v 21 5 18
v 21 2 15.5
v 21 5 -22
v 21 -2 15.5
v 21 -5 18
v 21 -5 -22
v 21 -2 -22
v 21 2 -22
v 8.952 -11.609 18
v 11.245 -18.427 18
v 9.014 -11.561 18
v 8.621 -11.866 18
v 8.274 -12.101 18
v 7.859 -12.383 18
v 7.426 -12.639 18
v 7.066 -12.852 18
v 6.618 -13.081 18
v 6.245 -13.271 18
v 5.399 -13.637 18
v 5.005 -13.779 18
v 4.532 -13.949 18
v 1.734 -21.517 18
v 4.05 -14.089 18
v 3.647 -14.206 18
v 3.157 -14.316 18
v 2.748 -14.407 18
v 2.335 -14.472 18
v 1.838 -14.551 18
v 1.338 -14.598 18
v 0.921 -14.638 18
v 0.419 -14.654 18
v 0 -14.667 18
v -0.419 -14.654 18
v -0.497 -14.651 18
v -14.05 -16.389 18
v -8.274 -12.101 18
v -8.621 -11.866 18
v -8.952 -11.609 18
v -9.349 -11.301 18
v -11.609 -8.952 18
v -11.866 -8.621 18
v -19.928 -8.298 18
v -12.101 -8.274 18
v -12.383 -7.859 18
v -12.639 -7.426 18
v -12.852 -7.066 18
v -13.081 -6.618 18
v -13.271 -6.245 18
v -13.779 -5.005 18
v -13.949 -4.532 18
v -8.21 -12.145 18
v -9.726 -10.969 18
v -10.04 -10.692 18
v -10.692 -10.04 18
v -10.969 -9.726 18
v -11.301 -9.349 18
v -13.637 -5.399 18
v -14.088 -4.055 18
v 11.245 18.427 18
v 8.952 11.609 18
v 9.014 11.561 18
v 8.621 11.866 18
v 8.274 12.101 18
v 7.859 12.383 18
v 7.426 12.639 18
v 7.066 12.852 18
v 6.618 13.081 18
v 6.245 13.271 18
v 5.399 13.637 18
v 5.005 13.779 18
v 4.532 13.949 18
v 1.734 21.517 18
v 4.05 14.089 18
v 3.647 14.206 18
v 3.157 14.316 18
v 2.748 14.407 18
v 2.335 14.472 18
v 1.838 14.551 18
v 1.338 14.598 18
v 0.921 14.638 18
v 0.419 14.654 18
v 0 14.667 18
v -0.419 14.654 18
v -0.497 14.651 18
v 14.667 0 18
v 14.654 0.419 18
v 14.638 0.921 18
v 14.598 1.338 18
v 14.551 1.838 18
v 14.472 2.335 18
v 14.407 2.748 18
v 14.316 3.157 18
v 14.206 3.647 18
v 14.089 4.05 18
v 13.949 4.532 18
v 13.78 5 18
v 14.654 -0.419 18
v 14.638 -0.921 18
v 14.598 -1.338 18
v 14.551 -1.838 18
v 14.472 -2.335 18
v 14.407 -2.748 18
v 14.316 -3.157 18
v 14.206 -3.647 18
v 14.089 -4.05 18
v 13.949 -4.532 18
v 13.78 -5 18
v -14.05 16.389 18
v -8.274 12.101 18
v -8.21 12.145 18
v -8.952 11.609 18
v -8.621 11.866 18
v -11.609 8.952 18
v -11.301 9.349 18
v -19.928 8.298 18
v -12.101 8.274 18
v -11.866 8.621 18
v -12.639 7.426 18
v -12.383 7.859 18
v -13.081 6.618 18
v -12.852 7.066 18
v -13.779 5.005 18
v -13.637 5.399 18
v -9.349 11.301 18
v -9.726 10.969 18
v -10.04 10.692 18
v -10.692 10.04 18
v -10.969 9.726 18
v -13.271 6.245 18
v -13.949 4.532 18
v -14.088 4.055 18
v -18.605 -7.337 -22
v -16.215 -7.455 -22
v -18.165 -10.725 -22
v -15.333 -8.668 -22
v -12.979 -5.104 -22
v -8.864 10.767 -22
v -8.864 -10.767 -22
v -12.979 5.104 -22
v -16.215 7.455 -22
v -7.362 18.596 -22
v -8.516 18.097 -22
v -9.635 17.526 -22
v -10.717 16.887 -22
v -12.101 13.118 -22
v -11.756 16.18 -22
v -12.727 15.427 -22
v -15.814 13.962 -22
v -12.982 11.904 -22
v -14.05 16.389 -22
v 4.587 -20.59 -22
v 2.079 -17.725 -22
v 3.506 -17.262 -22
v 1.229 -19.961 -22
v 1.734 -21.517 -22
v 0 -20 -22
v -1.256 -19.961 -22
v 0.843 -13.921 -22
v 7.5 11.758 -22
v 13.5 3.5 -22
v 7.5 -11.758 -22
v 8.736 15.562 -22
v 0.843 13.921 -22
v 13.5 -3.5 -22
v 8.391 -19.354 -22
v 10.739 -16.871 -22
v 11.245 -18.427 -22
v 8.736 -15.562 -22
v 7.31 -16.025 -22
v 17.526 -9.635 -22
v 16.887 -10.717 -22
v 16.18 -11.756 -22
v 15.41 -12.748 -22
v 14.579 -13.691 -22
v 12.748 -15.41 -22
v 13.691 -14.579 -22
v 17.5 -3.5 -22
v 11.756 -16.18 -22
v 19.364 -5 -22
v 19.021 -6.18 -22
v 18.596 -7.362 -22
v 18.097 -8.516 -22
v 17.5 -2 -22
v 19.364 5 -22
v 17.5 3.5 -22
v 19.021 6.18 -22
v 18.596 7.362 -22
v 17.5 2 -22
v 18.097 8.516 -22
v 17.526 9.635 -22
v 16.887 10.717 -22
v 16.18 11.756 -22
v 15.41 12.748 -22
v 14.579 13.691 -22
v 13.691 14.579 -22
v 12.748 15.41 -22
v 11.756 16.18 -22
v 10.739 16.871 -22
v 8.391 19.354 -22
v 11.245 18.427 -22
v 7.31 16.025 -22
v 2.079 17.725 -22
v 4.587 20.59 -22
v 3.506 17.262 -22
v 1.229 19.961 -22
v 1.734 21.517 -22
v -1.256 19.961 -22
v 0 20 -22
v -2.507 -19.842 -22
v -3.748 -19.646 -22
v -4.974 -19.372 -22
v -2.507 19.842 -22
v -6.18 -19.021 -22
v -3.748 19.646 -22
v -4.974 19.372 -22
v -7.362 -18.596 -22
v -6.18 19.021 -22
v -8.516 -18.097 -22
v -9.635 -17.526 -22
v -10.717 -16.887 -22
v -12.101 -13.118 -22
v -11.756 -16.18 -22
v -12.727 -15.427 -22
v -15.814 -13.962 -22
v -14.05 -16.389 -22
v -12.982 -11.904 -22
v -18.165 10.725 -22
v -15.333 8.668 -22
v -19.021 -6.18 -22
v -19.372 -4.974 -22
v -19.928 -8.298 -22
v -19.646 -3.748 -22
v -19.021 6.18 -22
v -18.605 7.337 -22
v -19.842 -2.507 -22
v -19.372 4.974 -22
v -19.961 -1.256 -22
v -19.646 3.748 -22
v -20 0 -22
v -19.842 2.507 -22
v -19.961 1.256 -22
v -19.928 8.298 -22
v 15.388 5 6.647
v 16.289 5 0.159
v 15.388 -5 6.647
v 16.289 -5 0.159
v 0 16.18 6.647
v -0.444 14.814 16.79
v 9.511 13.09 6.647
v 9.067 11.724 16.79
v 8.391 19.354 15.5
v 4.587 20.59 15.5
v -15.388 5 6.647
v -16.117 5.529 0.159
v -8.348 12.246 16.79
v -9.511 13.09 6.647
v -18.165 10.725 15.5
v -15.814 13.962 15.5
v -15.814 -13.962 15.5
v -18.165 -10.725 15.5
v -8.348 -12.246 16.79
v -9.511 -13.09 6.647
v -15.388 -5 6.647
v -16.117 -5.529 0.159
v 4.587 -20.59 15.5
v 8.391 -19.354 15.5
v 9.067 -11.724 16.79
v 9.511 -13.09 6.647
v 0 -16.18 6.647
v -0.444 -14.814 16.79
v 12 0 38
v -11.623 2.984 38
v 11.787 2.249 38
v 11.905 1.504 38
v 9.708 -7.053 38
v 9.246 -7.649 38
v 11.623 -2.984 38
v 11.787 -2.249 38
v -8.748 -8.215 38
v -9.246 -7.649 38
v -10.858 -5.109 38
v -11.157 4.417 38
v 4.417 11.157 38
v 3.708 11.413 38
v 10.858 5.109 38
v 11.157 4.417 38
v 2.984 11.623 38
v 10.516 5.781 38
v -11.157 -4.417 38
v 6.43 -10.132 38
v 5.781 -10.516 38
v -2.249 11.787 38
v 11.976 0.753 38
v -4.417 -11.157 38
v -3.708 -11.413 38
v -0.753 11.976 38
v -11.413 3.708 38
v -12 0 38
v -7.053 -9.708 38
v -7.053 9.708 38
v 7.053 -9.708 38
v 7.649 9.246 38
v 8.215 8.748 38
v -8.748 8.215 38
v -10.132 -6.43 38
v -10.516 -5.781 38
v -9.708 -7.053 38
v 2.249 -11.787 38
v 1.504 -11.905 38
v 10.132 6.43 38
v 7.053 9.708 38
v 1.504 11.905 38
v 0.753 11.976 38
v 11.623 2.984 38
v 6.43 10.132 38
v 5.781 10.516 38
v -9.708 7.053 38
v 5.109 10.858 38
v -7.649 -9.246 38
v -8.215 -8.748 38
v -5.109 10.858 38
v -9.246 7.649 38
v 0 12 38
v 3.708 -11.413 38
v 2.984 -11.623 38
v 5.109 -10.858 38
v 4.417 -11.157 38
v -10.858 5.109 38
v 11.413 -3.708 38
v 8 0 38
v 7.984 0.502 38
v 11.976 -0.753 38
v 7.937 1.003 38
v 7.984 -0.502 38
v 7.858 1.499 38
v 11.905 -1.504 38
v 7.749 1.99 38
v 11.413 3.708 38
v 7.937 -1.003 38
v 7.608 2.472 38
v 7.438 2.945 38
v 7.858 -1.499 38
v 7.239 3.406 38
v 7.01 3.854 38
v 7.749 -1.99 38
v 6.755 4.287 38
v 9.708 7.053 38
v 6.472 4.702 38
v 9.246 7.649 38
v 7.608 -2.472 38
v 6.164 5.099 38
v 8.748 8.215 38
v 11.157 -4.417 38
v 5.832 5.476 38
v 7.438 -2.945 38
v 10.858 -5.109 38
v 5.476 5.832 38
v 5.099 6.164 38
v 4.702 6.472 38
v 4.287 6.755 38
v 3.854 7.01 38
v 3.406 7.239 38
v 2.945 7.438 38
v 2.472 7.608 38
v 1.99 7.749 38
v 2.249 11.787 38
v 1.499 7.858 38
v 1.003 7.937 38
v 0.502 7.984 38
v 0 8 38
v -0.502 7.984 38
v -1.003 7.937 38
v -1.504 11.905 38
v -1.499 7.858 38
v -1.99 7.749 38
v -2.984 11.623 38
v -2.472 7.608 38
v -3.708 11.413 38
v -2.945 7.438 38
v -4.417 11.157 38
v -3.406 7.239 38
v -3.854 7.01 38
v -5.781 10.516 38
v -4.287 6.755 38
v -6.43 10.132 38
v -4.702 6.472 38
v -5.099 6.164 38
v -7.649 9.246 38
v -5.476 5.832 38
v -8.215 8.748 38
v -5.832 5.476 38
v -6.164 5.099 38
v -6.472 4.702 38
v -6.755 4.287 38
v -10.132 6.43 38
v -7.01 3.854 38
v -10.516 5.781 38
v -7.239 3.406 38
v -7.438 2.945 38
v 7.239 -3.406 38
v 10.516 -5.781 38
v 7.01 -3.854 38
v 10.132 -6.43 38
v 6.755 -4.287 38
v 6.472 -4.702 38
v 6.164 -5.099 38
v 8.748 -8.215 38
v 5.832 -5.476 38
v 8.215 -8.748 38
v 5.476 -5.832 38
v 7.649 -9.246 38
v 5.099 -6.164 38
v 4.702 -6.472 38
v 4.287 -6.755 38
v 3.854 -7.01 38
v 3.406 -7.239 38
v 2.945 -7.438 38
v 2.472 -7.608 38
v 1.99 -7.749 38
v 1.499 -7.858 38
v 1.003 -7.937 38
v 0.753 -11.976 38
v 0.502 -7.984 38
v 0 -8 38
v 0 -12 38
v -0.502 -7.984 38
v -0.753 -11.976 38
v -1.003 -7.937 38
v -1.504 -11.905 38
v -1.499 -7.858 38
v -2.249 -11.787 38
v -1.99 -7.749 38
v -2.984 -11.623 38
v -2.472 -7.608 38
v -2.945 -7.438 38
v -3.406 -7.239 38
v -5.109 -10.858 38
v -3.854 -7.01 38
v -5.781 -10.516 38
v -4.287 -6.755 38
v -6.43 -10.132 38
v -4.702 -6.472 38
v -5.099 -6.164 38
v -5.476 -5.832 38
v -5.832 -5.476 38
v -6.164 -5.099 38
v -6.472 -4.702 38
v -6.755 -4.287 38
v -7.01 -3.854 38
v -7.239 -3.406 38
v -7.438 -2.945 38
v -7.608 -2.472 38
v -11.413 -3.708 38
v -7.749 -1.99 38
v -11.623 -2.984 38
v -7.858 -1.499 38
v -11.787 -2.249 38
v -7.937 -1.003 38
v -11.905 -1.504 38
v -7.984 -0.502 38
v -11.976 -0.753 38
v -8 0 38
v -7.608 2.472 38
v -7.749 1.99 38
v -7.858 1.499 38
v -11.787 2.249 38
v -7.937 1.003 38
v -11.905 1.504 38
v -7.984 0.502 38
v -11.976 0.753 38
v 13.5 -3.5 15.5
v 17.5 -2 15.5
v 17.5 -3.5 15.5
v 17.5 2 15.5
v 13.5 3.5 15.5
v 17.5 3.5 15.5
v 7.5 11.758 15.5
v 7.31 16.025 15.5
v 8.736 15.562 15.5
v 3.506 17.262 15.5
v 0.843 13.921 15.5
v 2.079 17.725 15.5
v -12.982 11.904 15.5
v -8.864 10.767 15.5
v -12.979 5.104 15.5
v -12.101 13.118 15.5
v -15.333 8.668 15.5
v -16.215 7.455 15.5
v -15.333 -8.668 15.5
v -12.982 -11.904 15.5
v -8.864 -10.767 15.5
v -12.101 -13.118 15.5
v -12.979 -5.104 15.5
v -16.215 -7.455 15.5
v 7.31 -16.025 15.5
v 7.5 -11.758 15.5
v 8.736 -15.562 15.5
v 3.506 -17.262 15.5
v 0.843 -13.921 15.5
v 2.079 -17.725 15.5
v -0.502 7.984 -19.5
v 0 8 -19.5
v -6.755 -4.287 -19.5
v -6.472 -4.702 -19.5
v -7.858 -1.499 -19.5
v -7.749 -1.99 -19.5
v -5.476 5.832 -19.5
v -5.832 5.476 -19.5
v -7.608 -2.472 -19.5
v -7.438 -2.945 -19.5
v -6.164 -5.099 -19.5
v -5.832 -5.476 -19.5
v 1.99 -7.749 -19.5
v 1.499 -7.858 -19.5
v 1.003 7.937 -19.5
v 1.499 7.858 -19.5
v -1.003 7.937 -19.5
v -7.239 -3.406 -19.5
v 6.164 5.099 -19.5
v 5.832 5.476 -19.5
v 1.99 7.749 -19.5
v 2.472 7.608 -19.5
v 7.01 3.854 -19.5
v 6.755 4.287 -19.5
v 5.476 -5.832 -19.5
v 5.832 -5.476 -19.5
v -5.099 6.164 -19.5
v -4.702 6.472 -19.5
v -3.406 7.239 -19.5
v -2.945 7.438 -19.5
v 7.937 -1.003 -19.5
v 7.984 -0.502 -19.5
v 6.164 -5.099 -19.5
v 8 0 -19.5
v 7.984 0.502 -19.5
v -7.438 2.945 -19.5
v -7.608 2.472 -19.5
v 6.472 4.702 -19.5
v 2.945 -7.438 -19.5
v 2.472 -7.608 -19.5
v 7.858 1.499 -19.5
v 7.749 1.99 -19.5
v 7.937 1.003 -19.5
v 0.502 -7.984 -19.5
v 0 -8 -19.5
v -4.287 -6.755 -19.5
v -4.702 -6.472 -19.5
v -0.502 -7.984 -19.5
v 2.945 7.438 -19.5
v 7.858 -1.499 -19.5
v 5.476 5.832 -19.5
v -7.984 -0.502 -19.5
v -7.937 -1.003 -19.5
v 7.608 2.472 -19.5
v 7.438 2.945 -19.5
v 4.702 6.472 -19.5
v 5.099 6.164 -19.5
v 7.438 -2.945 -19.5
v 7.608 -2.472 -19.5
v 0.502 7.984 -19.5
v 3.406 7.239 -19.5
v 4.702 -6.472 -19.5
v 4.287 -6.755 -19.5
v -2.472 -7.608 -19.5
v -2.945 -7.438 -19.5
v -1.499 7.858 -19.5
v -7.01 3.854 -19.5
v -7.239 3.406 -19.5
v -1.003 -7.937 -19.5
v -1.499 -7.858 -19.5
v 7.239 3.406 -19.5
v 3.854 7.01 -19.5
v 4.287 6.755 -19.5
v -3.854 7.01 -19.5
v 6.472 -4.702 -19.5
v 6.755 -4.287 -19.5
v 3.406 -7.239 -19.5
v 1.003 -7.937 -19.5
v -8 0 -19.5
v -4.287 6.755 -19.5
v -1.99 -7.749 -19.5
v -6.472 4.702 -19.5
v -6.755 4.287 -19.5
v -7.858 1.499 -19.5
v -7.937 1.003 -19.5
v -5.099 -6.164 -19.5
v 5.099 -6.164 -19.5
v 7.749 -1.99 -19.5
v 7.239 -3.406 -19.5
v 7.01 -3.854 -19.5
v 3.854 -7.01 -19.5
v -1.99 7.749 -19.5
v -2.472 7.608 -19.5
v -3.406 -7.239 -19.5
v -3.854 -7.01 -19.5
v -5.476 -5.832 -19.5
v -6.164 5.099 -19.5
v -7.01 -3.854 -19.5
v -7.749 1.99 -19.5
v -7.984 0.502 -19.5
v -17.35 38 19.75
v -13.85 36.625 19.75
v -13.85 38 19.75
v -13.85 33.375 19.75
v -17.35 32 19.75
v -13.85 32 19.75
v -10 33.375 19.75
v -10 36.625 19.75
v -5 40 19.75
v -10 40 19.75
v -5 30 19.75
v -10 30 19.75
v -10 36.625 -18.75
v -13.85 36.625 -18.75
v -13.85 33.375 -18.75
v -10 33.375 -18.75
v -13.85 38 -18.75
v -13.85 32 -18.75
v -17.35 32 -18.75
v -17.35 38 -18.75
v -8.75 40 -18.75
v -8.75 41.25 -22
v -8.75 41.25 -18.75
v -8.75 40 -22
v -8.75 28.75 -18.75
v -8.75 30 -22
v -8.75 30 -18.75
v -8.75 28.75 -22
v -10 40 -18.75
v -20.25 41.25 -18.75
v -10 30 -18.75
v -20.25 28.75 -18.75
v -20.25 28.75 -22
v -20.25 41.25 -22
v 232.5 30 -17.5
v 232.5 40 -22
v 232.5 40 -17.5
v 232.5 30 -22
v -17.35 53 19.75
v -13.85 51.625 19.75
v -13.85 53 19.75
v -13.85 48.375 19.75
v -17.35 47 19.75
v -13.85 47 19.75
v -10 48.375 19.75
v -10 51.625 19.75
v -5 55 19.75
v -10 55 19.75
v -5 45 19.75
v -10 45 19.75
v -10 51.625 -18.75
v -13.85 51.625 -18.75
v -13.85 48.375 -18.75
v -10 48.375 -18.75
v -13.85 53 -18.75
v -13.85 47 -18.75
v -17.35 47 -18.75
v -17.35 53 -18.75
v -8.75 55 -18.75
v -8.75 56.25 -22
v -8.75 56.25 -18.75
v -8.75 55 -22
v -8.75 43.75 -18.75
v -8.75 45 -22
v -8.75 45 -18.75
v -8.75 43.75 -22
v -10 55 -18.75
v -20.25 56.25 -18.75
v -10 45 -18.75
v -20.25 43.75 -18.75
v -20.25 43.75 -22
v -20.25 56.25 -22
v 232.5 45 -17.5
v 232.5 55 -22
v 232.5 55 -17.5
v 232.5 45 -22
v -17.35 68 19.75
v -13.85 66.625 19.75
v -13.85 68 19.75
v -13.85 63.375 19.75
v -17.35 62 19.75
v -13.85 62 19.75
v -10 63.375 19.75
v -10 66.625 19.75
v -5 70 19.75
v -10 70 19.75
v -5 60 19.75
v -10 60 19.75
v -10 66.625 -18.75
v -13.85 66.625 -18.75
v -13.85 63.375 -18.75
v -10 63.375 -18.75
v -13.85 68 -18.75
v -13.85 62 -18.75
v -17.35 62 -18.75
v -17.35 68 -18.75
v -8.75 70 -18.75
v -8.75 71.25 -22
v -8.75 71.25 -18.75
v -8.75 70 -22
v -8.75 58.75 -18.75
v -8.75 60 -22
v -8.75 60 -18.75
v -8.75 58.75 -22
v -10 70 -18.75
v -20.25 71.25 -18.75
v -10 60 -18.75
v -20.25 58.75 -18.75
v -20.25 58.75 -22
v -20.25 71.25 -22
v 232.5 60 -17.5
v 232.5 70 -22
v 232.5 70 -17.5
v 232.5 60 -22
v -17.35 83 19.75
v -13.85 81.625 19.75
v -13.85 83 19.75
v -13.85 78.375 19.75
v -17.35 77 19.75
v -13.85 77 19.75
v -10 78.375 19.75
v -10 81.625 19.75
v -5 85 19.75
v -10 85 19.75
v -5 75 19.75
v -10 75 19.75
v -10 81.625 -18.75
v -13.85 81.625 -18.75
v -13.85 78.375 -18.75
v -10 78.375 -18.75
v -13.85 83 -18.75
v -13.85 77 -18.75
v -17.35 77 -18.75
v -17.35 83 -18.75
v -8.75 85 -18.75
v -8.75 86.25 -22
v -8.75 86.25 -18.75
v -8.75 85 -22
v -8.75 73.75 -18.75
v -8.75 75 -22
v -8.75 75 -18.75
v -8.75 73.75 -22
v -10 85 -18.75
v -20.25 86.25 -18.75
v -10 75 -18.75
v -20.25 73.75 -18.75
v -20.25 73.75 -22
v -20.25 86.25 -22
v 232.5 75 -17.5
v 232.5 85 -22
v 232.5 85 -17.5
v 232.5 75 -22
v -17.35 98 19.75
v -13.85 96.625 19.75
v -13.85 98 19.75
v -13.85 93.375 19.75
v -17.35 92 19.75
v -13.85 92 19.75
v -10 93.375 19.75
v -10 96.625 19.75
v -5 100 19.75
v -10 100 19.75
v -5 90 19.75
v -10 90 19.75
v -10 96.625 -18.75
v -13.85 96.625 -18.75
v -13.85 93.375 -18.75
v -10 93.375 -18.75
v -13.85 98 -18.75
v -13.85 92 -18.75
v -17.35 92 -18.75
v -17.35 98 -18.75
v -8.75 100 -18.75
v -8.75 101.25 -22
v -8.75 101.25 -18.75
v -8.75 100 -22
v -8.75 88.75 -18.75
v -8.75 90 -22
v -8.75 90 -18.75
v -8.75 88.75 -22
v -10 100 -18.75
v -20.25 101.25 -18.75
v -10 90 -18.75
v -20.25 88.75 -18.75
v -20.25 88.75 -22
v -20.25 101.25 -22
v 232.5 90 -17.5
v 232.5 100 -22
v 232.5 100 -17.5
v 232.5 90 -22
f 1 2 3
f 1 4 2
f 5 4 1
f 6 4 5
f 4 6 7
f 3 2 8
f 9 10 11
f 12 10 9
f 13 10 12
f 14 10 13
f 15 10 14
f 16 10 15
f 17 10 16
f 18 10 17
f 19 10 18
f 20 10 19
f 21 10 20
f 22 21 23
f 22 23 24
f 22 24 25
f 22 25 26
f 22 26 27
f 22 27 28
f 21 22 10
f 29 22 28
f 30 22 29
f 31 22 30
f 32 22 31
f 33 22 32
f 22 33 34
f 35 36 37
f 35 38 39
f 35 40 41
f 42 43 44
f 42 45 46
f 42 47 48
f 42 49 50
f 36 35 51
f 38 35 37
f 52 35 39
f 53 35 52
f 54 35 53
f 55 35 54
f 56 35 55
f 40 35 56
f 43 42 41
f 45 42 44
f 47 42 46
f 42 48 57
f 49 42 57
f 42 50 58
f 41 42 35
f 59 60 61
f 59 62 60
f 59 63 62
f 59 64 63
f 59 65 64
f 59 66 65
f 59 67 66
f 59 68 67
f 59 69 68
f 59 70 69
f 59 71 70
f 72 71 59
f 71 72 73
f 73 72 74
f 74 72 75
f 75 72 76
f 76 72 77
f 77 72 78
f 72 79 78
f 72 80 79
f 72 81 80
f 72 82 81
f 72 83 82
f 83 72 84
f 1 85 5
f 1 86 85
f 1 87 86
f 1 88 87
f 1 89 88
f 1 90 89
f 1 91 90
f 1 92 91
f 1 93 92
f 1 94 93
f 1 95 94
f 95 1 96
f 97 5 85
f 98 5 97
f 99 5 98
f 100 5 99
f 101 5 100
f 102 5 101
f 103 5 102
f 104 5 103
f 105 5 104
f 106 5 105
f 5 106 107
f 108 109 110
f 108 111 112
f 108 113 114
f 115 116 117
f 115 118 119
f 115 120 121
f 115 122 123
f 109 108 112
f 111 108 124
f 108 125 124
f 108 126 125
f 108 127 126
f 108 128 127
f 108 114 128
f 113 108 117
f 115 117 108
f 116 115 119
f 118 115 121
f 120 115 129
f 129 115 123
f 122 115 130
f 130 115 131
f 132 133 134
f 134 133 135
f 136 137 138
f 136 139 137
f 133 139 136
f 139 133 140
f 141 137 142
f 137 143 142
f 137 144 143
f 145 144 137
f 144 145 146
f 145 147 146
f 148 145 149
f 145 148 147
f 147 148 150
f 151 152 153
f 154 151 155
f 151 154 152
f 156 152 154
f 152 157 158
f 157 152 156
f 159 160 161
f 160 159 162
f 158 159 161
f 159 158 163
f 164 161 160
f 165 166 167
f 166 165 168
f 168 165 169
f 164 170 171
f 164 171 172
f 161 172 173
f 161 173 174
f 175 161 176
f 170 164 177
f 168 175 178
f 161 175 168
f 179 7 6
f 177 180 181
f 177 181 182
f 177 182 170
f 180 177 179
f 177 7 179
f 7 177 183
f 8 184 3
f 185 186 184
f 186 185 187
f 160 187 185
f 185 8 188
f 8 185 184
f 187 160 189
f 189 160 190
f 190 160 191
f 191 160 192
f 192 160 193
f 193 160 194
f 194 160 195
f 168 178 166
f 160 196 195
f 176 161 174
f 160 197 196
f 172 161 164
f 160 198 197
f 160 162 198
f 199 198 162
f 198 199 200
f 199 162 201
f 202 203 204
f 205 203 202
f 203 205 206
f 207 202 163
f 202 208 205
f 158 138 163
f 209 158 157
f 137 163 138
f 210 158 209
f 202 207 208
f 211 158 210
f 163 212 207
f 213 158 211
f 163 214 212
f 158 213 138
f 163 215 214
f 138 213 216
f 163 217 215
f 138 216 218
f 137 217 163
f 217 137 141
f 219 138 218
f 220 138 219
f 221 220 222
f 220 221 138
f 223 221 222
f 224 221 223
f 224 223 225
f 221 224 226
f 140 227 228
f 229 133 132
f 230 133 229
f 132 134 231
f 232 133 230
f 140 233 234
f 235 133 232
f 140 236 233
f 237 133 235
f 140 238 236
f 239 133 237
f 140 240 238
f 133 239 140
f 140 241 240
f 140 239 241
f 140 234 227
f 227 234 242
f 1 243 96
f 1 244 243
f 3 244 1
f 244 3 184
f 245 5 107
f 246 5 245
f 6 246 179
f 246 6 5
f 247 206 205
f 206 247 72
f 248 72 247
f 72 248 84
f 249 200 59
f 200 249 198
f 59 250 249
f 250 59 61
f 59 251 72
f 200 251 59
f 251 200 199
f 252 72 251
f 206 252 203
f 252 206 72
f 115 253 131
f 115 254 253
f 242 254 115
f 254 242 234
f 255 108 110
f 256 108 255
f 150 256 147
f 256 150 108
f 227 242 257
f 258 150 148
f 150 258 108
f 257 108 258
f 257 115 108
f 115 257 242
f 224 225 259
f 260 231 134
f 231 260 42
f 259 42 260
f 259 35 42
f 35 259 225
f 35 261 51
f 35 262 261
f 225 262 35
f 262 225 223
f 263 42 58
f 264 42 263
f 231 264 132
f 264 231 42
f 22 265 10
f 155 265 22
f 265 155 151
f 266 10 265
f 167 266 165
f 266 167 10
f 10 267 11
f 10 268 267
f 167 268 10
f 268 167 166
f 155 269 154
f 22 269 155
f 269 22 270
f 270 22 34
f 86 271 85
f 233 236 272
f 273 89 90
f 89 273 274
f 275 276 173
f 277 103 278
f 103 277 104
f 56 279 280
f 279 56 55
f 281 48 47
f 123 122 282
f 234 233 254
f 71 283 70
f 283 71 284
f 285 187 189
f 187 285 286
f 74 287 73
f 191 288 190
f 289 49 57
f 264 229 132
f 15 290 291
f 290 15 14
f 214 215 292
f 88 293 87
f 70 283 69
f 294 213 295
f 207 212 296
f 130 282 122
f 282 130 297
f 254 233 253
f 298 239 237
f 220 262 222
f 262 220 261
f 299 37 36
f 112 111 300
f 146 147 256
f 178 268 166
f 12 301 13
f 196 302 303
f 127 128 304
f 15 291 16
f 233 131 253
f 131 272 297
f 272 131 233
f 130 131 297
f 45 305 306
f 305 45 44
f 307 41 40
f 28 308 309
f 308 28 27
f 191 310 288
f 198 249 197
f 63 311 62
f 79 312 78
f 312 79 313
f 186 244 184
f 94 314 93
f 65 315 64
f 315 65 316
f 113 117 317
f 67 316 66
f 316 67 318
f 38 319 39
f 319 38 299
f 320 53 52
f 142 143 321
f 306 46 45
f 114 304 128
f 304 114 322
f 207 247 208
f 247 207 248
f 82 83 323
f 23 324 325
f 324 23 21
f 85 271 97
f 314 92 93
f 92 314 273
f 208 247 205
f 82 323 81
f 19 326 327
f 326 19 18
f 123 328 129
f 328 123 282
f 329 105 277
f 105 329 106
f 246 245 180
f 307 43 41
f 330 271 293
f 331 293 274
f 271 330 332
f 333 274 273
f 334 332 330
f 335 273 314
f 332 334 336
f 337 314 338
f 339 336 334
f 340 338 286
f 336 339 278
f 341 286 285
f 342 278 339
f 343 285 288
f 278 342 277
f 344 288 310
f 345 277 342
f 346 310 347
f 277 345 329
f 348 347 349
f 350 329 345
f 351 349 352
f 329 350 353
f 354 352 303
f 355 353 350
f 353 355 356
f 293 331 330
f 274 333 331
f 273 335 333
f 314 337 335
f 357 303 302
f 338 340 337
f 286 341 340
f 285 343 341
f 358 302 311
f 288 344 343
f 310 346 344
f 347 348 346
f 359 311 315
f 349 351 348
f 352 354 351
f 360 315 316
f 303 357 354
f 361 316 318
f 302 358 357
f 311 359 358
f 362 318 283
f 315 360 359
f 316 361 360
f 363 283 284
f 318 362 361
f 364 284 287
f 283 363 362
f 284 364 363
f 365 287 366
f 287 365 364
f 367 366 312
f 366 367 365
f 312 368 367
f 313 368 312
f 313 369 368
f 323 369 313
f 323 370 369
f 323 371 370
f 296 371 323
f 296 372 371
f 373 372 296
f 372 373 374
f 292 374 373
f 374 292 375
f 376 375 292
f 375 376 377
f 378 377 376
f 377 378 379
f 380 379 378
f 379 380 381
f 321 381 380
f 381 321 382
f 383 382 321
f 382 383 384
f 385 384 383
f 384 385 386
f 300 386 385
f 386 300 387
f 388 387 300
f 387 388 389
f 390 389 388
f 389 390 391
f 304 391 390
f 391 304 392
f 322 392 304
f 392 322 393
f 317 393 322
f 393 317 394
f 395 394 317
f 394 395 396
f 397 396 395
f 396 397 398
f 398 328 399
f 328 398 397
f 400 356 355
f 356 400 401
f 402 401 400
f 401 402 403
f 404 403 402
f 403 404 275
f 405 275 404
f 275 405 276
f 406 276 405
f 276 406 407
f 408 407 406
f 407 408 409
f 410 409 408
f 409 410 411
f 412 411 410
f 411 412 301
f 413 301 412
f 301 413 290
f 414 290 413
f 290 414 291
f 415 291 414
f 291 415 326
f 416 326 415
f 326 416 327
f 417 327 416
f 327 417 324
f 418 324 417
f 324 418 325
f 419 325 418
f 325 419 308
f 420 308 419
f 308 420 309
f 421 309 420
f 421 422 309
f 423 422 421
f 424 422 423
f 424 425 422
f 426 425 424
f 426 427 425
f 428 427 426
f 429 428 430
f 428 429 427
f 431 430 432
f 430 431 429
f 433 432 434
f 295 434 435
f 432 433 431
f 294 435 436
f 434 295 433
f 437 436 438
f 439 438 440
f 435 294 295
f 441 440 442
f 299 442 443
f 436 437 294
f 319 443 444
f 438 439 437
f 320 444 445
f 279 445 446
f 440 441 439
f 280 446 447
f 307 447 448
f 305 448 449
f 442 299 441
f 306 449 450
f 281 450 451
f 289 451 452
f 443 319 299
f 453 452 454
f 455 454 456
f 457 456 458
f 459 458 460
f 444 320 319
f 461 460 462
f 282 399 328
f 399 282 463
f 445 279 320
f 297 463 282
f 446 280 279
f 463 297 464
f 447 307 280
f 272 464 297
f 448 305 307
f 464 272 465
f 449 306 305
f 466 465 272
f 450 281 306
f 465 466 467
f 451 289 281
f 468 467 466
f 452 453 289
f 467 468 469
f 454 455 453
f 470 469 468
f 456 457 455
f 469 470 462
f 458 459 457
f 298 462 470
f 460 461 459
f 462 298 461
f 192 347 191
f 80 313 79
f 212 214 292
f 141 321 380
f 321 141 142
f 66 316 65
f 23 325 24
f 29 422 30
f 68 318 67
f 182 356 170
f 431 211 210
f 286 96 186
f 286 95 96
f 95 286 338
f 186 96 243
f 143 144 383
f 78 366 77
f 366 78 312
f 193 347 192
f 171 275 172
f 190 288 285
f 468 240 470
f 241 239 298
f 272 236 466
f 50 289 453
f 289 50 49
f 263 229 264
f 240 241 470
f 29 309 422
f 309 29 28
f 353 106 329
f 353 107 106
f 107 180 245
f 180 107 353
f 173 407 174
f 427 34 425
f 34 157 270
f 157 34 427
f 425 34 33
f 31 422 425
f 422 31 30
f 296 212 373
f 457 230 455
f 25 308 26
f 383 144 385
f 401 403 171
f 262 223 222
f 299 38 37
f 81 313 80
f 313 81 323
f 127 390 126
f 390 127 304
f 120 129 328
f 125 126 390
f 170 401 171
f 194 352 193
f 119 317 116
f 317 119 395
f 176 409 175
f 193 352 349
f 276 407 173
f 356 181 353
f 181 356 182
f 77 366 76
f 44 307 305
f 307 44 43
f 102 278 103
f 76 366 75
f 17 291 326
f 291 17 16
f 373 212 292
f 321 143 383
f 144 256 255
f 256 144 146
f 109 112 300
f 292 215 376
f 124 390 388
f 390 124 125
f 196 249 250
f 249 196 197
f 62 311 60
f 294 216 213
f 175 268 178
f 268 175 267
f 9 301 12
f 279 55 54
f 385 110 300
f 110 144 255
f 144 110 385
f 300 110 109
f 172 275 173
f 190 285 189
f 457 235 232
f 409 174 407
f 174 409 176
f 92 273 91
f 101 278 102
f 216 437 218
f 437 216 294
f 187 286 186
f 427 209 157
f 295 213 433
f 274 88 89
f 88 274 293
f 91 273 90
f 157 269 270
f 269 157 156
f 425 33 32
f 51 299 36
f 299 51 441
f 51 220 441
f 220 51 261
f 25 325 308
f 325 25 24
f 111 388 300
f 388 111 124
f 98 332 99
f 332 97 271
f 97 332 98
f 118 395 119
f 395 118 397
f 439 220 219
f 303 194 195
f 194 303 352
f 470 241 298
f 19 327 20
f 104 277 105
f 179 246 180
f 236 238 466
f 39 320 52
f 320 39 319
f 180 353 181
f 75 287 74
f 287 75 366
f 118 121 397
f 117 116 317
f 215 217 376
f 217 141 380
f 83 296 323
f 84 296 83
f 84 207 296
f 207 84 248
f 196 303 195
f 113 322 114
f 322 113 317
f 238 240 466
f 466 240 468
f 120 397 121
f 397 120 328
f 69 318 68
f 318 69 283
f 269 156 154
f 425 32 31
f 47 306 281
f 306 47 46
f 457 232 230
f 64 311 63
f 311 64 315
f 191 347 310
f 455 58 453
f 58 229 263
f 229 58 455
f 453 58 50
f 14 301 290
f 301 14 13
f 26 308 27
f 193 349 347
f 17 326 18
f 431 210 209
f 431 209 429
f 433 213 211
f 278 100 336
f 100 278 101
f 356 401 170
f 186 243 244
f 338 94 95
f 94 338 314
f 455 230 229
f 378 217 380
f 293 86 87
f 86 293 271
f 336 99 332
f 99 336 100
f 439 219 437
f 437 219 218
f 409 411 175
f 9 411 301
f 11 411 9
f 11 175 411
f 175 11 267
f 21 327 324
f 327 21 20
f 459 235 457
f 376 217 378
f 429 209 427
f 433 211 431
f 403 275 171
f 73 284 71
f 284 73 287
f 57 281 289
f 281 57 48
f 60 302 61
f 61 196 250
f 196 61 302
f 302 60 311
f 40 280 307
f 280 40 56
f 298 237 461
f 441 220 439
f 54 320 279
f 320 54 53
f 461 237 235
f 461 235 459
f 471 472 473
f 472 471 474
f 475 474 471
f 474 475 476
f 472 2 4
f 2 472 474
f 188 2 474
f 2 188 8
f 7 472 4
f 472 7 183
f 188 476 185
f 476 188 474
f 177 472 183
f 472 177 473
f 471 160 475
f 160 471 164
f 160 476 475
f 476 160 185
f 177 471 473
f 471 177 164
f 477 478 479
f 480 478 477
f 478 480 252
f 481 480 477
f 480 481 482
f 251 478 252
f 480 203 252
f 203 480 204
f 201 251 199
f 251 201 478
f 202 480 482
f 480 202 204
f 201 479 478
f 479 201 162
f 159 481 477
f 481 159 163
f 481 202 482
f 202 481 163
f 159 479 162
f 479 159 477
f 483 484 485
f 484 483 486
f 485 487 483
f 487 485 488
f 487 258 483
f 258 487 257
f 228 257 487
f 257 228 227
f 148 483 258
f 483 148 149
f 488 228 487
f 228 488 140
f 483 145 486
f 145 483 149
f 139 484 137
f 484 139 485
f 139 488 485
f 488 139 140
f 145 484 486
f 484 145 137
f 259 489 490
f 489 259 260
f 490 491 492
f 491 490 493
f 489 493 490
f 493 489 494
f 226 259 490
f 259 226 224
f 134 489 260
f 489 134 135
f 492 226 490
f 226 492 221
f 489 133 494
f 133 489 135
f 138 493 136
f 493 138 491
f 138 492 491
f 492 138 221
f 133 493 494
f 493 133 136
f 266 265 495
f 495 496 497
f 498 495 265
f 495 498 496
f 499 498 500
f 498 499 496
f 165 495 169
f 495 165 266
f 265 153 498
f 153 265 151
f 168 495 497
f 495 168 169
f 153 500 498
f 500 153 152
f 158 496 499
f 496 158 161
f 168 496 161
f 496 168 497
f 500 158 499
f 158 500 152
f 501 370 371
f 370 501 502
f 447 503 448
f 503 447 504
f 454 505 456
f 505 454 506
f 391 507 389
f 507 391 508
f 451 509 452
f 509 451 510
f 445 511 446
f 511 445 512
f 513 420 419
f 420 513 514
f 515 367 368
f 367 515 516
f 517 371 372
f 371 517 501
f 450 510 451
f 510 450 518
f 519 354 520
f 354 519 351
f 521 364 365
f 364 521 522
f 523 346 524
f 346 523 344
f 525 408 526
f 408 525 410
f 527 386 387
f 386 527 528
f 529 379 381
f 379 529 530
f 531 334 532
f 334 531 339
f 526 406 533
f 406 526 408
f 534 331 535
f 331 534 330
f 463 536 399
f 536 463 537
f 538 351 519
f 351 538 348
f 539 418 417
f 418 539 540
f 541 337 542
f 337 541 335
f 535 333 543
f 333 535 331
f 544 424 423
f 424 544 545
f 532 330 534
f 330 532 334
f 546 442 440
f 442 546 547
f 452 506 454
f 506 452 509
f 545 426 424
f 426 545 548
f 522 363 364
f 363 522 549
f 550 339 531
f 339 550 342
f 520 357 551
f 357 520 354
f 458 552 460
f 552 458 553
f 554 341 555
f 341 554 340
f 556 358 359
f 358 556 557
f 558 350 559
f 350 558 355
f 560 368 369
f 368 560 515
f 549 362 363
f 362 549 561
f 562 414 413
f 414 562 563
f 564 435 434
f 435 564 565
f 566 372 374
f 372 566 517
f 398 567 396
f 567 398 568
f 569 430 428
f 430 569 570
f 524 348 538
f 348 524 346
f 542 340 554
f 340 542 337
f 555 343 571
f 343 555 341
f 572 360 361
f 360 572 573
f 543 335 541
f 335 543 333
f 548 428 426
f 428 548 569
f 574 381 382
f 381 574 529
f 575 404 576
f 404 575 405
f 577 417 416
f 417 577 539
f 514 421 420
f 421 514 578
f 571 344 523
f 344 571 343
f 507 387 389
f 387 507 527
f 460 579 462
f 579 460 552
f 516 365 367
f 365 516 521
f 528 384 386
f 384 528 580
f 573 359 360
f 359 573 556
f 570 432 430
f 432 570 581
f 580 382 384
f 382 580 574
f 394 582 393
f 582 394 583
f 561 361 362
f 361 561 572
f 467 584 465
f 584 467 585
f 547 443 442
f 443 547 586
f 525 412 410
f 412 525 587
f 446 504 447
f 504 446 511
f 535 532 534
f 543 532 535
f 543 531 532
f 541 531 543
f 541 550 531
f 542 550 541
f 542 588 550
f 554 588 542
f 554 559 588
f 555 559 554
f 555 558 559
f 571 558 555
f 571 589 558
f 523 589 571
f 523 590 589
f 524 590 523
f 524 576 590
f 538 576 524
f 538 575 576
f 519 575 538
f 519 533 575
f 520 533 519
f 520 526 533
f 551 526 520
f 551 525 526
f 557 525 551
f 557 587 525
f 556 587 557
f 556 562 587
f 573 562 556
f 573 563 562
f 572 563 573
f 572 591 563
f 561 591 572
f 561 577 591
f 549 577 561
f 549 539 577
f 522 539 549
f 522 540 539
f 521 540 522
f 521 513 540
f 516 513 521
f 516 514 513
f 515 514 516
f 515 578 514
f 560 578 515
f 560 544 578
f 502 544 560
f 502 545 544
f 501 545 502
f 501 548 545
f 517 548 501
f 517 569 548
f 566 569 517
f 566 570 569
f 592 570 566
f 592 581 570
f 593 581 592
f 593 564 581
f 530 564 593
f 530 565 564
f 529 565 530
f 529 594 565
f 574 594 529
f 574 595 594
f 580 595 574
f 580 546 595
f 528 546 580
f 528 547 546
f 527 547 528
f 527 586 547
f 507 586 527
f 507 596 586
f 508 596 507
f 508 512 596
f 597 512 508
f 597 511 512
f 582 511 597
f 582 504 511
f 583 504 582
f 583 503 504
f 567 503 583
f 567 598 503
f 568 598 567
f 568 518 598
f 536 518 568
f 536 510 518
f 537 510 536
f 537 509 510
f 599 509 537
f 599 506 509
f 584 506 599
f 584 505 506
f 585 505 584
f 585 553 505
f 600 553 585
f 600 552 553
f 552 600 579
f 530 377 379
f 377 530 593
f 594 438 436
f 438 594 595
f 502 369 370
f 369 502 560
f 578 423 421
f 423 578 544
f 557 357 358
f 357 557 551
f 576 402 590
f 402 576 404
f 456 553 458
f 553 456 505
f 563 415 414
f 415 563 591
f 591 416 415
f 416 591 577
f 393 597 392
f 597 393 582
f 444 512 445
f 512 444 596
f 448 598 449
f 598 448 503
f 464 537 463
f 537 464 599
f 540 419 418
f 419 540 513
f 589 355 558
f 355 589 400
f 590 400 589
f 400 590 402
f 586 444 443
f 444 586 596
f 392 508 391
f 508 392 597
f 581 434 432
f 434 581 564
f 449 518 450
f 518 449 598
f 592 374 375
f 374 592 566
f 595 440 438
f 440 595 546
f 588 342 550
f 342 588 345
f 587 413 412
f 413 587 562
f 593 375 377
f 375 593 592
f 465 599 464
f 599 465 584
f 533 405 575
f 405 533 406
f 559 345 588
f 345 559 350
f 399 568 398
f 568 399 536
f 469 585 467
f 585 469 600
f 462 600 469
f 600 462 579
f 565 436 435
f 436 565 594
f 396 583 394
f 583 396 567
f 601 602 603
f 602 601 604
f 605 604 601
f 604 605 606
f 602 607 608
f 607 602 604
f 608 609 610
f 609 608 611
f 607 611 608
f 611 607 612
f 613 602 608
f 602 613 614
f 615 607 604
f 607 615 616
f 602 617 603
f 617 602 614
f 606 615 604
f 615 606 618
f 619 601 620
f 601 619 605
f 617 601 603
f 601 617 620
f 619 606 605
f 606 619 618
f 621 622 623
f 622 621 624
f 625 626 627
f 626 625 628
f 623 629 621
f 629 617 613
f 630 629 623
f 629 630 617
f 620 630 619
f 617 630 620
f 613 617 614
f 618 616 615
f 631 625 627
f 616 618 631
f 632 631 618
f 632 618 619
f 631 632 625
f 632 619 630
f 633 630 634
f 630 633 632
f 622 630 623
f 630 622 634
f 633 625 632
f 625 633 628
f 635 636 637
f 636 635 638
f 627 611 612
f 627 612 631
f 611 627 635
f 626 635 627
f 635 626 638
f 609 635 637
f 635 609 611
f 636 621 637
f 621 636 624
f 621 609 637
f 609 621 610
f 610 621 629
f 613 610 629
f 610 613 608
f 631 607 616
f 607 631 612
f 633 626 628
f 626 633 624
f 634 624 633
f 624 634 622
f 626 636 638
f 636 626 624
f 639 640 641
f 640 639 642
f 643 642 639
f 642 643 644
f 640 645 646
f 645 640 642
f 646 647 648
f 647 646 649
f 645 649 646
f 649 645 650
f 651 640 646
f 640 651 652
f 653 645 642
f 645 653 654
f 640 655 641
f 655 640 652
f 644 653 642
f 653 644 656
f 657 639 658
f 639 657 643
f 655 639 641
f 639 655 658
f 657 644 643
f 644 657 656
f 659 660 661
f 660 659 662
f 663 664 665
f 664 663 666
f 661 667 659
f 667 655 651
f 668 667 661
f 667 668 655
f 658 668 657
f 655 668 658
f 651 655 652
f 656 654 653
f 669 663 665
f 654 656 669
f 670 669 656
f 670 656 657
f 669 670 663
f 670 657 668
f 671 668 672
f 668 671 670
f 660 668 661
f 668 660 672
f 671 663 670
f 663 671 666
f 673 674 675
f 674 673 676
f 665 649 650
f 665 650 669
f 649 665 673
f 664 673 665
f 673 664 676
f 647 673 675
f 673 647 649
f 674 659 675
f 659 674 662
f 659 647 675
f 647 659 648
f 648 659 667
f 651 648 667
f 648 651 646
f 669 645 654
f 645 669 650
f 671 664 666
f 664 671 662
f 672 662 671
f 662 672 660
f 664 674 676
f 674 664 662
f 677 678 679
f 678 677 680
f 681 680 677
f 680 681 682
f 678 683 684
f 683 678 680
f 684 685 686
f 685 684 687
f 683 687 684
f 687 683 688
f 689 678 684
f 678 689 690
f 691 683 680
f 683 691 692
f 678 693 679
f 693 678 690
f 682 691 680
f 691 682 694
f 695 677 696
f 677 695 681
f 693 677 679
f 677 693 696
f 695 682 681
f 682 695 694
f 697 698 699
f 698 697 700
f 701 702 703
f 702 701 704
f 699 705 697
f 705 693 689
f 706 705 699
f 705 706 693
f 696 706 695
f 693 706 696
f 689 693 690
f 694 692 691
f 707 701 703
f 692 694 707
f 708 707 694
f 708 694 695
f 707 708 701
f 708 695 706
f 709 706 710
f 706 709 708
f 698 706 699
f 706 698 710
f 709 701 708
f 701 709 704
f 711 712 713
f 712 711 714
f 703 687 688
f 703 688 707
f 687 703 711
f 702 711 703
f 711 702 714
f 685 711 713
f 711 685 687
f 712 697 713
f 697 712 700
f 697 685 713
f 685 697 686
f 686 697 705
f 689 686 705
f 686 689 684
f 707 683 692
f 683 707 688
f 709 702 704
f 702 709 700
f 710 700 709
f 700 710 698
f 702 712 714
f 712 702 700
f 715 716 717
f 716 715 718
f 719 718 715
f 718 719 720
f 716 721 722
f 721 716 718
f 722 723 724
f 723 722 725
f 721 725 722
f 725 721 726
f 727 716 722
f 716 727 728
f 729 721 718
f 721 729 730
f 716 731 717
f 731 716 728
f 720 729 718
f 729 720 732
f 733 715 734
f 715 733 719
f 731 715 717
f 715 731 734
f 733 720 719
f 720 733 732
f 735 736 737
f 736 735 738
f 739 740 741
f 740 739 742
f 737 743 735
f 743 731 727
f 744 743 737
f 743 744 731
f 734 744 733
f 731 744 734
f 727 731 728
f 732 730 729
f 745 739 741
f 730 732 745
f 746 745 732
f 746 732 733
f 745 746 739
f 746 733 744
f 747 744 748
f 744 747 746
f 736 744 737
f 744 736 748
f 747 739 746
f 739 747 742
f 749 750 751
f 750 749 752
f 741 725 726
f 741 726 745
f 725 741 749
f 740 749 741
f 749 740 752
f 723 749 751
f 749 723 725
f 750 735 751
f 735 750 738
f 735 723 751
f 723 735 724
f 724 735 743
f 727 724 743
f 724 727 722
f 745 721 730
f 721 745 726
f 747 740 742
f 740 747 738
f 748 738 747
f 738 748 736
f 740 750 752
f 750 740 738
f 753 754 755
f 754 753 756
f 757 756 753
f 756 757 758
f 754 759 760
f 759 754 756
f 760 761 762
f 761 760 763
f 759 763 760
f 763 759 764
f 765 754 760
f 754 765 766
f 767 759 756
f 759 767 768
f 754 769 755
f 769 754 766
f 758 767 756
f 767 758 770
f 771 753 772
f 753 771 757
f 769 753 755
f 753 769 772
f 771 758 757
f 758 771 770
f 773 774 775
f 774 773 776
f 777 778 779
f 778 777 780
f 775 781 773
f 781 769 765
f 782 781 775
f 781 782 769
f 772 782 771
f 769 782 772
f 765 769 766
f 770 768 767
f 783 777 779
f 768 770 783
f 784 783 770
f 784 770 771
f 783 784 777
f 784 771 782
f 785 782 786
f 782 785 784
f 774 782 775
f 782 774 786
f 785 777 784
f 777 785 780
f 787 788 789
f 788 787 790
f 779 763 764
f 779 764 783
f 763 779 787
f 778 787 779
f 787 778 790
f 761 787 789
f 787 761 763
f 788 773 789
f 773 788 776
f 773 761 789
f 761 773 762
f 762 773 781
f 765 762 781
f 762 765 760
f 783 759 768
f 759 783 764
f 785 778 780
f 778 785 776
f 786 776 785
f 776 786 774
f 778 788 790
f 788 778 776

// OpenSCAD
// Which part to render
 part = "everything"; // [everything:Everything,main_piece:Main Part,feet:All Feet,foot:One Foot]


// Pole diameter in mm
pipeDiameter = 16.0;

// Number of spokes
numberOfFeet = 5; // [3:7]

// Length of an individual foot in mm
footLength = 250;

// Style of cutout in the feet; "none" is recommended. If you want to use less plastic, change the infill in your slicer
cutoutStyle = "none"; // [none, circles]

// Resolution of the circles in the model; smaller renders faster, higher looks better
resolution = 100;

/* [Hidden] */

// Whether to render the hub piece
printMainPiece = true;

// Whether to render the spokes
printFeet = true;

bottom = pipeDiameter > 25 ? pipeDiameter + 15 : 40;
top = pipeDiameter > 25 ? pipeDiameter + 5 : pipeDiameter + 8;
distance = pipeDiameter > 25 ? pipeDiameter - 5 : 20;


module MainPiece() {
	translate([0,0,-4]) {
		difference() {
			union() {
				translate([0,0,20]) cylinder(h=120, r1=bottom, r2=top, center=true, $fn=100);
				
				for (i = [0:numberOfFeet-1]) {
					rotate([0,0,i*(360/numberOfFeet)]) {
						translate([distance+2,0,0]) {
							cube(size = [40,20,80], center = true);
						}
					}
				}
			}
			translate([0,0,5+20]) {
				cylinder(h=120, r1=pipeDiameter, r2=pipeDiameter, center=true, $fn = resolution);
			}
			for (i = [0:numberOfFeet-1]) {
				rotate([0,0,i*(360/numberOfFeet)]) {
					translate([distance+2,0,0]) {
						translate([16,0,-5]) {
							cube(size = [20,8,80], center = true);
						}
						translate([9,0,-5]) {
							cube(size = [8,14,80], center = true);
						}
					}
				}
			}
		}
		for (i = [0:numberOfFeet-1]) {
			rotate([0,0,i*(360/numberOfFeet)+(360/numberOfFeet/2)]) {
				translate([distance+10,0,-20]) {
					hull() {
						rotate([-90,0,0]) {
							translate([0,0,0]) cylinder(h=2, r1=2, r2=2, center=true, $fn=10);
							translate([-10,-5,0]) cylinder(h=2, r1=2, r2=2, center=true, $fn=10);
							translate([-7,-50,0]) cylinder(h=2, r1=2, r2=2, center=true, $fn=10);
						}
					}
				}
			}
		}
	}
}

module Foot(offset) {
	footSize = footLength*2;
	
	translate([40+distance,offset*30 - 30,0]) {
		difference() {
			union() {
				// attachment (front piece)
				translate([15,0,-0.5]) {
					cube(size = [18,6.5,80], center = true);
				}
				// attachment (back piece)
				translate([8.8,0,-0.5]) {
					cube(size = [7,12,80], center = true);
				}
				// attachment (bottom bit)
				translate([11,0,-42.5]) {
					cube(size = [23,25,10], center = true);
				}
				hull() {
					translate([25,0,-2.5]) {
						cube(size = [10,20,84], center = true);
					}
					
					translate([footSize,0,-40]) {
						cube(size = [10,20,10], center = true);
					}
				}
			}
			
			/* ground */
			translate([240,0,-74]) {
				 cube(size = [footSize*2,100,60], center = true);
			}
			
			if(cutoutStyle == "circles") {
				for(i = [50 : 30 : footLength]) {
					translate([i*2-20,0,(((footLength-i)/footLength)*40)-40]) rotate([90,0,0]) cylinder(h=120, r=((footLength-i)/footLength)*35, center=true, $fn = resolution);
				}
			}
		}
	}
}

module Feet() {
	translate([-100,100,000]) {
		for (i = [0:numberOfFeet-1]) Foot(i);
	}
}

scale([0.5,0.5,0.5]) {
	if(part == "everything" || part == "main_piece") MainPiece();
	if(part == "everything" || part == "feet") if(printFeet) Feet();
	if(part == "foot") if(printFeet) Foot(0);
}
